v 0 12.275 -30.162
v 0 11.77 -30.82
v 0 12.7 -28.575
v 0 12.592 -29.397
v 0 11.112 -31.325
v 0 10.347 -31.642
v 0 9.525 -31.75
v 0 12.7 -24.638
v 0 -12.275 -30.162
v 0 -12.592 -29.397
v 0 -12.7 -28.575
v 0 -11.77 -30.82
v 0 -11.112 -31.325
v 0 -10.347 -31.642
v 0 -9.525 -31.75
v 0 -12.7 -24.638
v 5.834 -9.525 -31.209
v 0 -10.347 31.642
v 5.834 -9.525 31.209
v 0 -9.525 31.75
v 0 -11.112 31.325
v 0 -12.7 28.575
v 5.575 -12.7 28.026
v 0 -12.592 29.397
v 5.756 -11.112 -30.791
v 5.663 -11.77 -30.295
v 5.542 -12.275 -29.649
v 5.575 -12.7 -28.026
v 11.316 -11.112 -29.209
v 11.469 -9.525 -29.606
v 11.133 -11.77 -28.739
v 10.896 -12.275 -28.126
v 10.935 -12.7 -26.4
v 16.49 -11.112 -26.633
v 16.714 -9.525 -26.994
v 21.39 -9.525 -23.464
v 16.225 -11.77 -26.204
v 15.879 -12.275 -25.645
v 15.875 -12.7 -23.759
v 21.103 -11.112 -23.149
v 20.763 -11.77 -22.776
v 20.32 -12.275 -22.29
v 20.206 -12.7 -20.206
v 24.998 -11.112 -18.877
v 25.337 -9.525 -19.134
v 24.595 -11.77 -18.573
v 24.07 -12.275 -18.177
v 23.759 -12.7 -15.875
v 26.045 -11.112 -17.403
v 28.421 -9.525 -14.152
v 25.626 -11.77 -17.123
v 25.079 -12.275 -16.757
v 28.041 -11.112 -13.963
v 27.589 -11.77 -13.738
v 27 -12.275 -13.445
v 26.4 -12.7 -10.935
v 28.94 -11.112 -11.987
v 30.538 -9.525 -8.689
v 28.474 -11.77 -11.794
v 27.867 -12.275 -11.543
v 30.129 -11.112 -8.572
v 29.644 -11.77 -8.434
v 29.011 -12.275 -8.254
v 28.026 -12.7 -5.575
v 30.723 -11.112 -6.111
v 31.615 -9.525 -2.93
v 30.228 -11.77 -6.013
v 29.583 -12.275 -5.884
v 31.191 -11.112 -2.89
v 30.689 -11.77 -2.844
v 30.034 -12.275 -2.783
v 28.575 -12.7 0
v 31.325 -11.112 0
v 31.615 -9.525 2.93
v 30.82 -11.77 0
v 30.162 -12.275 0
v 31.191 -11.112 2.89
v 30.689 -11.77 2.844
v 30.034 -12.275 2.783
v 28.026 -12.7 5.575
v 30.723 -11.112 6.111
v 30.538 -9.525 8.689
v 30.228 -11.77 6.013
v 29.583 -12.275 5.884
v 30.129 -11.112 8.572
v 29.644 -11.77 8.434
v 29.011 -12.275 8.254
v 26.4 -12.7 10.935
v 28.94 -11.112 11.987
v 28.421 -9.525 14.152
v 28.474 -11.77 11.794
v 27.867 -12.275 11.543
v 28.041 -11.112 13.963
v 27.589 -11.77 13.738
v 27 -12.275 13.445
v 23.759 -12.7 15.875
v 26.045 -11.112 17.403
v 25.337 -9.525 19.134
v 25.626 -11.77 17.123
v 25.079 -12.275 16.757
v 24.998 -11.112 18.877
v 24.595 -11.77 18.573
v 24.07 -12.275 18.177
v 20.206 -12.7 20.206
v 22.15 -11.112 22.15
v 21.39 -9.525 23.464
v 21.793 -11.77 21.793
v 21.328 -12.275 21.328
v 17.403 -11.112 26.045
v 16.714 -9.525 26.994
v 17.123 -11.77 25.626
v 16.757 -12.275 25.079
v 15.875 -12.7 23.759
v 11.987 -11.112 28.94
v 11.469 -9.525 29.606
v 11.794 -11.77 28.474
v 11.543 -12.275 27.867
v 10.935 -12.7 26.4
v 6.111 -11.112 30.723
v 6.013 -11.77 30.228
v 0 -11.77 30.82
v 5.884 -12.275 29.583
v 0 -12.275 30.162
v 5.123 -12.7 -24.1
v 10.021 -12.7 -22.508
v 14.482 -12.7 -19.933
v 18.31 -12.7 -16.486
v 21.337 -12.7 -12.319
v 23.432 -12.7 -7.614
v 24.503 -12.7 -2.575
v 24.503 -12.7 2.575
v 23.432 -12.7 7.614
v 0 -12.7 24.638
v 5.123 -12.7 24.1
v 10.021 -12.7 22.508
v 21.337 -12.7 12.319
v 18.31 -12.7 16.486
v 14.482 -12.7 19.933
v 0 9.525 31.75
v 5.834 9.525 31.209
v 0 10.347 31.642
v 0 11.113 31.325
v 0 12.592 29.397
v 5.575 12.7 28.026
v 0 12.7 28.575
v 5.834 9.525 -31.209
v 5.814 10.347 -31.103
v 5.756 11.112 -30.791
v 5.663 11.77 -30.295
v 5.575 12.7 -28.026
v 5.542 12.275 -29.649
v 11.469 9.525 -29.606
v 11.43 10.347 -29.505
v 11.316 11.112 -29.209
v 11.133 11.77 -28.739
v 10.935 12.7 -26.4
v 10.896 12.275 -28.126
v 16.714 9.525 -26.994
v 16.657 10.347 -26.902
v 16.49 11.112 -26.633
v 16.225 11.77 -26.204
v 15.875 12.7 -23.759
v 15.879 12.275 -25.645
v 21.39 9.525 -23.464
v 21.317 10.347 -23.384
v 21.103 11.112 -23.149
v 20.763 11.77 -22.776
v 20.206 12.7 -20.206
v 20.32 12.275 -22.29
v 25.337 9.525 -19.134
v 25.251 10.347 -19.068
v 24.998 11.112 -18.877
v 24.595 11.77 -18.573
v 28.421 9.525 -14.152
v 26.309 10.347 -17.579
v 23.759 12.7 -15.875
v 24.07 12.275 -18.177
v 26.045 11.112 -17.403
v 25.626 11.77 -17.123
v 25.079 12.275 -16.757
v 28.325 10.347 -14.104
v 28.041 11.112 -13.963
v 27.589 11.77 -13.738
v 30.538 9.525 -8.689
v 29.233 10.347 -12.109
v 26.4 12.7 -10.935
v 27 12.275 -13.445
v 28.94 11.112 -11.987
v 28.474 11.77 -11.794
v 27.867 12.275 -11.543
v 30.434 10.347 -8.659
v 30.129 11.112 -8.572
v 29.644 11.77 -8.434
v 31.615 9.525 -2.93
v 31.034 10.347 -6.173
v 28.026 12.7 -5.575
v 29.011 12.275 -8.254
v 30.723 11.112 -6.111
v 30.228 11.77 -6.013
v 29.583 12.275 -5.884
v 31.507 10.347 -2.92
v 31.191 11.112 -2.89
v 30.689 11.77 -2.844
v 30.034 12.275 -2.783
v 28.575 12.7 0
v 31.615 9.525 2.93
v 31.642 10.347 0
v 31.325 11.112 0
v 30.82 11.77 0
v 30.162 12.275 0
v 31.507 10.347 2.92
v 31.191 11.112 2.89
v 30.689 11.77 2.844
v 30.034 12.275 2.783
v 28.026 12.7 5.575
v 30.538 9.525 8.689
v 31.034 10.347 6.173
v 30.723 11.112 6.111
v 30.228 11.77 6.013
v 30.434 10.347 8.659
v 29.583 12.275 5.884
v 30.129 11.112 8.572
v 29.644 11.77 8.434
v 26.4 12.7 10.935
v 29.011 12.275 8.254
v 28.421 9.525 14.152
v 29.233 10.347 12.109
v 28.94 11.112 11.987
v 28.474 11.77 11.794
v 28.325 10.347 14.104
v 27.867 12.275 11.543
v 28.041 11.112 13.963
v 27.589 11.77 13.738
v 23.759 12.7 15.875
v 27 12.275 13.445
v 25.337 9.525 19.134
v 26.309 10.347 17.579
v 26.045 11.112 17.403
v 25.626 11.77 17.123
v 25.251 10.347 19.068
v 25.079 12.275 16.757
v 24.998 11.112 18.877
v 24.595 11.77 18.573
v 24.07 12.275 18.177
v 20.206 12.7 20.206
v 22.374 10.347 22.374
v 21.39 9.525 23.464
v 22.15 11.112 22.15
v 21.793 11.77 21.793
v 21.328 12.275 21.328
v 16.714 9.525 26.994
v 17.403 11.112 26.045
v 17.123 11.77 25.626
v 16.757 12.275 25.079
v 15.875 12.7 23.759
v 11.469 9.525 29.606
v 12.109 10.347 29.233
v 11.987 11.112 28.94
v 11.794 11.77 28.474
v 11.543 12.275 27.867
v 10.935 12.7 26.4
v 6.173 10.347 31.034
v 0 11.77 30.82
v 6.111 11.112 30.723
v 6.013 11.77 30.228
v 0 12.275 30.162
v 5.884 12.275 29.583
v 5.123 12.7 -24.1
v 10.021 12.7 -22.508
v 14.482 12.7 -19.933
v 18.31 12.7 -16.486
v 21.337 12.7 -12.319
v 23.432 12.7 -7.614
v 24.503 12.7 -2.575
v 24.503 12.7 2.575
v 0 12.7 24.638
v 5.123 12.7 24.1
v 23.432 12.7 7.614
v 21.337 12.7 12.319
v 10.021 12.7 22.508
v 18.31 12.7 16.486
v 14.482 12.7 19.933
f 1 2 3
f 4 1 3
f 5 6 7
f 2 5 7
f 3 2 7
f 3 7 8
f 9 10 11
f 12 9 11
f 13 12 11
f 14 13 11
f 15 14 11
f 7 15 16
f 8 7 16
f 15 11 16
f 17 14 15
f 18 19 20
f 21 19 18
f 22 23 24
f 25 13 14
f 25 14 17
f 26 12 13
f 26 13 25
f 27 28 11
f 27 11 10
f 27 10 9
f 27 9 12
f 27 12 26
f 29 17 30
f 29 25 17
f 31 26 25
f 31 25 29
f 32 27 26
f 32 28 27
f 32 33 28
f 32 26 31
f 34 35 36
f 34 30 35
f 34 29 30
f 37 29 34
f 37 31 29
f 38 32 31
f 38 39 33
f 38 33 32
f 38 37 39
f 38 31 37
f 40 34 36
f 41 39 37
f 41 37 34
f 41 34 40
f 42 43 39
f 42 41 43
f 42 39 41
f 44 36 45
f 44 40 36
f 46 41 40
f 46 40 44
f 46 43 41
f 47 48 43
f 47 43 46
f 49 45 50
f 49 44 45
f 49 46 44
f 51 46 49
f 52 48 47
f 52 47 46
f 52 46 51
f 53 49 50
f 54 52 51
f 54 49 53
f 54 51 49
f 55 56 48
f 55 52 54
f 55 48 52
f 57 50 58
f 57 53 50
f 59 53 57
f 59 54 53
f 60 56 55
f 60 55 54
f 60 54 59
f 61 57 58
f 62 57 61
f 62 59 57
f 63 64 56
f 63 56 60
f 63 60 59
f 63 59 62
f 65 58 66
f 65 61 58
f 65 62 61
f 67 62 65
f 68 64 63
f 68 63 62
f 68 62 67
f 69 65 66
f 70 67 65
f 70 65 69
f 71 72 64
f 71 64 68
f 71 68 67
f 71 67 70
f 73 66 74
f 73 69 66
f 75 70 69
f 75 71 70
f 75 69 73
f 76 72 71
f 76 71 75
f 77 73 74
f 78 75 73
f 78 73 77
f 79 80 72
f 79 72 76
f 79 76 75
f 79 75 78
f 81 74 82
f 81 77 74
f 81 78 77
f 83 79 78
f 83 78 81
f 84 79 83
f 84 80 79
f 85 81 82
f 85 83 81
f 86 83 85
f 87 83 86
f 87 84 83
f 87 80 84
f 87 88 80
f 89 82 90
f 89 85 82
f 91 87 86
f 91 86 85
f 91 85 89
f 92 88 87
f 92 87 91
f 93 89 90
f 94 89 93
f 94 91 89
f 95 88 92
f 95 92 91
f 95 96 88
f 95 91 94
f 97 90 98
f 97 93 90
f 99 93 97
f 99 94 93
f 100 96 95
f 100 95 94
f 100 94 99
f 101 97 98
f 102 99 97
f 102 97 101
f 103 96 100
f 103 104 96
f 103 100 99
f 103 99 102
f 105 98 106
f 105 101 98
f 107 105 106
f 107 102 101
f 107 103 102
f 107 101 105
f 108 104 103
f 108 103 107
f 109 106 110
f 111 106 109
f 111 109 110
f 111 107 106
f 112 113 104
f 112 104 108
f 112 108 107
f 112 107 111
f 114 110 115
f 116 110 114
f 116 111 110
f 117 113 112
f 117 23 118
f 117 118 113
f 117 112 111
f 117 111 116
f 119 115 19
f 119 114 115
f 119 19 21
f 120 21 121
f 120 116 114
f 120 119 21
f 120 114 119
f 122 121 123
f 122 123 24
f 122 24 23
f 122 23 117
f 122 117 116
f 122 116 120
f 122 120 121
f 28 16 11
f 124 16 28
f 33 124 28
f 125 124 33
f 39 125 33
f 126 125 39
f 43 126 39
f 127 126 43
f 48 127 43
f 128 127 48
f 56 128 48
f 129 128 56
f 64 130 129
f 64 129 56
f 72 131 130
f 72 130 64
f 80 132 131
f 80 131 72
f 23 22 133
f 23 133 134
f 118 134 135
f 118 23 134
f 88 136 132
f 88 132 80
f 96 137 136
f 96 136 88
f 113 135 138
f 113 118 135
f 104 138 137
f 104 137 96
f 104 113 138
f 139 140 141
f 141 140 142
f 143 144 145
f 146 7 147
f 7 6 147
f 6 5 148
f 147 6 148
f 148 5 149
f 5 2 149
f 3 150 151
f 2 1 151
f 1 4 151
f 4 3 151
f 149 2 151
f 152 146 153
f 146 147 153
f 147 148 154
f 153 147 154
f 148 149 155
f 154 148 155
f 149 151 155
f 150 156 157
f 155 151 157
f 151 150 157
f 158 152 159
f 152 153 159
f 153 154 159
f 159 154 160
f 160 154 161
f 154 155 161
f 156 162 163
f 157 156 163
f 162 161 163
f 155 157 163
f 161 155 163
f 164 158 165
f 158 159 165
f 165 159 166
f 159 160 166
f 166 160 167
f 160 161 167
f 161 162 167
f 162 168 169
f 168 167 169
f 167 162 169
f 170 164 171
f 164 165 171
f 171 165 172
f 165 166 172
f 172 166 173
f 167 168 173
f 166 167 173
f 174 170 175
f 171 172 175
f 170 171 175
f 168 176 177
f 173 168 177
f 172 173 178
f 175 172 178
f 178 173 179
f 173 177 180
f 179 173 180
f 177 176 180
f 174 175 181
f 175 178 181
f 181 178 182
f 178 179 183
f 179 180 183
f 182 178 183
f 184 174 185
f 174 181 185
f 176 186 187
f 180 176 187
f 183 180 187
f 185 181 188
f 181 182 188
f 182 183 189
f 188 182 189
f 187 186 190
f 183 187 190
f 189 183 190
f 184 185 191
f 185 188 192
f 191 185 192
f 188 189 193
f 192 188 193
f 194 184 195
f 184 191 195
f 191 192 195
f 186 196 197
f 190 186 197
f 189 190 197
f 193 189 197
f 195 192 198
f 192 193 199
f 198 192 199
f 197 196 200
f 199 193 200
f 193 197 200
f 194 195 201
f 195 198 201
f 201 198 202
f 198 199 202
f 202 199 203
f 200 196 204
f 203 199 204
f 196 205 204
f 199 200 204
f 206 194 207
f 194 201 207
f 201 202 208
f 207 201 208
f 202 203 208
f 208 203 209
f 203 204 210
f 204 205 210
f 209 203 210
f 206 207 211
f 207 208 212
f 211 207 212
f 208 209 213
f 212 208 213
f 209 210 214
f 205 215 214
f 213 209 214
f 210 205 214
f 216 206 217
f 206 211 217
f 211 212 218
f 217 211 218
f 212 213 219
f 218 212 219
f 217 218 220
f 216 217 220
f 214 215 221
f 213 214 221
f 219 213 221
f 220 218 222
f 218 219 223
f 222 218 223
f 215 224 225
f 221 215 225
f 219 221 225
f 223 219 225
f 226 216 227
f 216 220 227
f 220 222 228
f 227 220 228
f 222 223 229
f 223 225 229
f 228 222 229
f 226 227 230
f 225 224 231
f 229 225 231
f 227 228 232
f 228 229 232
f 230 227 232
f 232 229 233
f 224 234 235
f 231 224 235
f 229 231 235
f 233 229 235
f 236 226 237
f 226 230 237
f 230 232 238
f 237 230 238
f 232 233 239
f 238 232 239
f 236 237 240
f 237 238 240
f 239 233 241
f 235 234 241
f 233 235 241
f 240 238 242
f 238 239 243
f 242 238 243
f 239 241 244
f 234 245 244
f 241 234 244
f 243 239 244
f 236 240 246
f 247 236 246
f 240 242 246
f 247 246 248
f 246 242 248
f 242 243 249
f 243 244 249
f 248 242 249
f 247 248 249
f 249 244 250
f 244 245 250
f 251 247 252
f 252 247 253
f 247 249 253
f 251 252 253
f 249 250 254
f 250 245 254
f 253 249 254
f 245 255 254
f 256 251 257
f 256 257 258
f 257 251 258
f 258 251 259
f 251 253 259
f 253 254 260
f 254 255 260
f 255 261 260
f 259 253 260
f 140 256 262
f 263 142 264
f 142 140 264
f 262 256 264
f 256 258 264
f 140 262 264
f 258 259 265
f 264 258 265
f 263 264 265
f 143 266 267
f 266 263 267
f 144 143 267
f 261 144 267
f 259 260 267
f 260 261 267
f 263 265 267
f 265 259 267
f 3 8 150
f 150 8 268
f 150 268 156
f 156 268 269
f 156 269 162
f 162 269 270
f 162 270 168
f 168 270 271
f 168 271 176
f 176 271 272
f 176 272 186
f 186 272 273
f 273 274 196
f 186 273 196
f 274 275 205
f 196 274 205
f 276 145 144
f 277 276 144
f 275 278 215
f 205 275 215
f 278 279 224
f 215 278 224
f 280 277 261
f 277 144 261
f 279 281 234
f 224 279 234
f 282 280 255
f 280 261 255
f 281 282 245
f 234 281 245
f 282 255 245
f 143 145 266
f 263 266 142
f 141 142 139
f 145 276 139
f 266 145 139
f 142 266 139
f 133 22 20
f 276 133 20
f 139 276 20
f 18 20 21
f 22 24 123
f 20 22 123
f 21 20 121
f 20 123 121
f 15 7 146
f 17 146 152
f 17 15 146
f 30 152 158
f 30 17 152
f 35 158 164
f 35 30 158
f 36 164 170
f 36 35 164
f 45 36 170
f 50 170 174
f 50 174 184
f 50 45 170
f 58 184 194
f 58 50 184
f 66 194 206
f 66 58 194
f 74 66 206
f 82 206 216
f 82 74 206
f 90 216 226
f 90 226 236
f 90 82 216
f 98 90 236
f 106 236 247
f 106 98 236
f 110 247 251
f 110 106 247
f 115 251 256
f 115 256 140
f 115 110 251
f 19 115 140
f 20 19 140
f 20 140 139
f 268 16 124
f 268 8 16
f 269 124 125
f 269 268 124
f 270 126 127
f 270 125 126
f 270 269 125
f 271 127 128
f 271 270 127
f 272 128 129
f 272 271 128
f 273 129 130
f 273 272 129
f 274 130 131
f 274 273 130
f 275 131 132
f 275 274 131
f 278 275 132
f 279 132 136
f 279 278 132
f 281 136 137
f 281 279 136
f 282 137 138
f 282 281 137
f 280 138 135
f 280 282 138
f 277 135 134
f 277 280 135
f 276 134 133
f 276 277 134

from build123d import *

# Parameters (mm, degrees)
F0_R     = 31.75
F0_R_2   = 24.638
F1_DEPTH = 12.7
F2_R     = 3.175
F3_W     = 32.752518
F3_H     = 69.030817
F4_DEPTH = 15.875


with BuildPart() as f1:
    # F0 (on Front) → F1 (new body, symmetric)
    with BuildSketch(Plane.XZ):
        Circle(F0_R)
        Circle(F0_R_2, mode=Mode.SUBTRACT)
    extrude(amount=F1_DEPTH, both=True)

    # F2
    f2_edges = [f1.edges().sort_by_distance(p)[0] for p in [
        (-31.75, -12.7, 0),
        (-31.75, 12.7, 0),
    ]]
    fillet(f2_edges, radius=F2_R)

    # F3 (on Front) → F4 (cut, symmetric)
    with BuildSketch(Plane.XZ):
        with Locations((-16.376259, -0.200259)):
            Rectangle(F3_W, F3_H)
    extrude(amount=F4_DEPTH, both=True, mode=Mode.SUBTRACT)


solid = f1.part
